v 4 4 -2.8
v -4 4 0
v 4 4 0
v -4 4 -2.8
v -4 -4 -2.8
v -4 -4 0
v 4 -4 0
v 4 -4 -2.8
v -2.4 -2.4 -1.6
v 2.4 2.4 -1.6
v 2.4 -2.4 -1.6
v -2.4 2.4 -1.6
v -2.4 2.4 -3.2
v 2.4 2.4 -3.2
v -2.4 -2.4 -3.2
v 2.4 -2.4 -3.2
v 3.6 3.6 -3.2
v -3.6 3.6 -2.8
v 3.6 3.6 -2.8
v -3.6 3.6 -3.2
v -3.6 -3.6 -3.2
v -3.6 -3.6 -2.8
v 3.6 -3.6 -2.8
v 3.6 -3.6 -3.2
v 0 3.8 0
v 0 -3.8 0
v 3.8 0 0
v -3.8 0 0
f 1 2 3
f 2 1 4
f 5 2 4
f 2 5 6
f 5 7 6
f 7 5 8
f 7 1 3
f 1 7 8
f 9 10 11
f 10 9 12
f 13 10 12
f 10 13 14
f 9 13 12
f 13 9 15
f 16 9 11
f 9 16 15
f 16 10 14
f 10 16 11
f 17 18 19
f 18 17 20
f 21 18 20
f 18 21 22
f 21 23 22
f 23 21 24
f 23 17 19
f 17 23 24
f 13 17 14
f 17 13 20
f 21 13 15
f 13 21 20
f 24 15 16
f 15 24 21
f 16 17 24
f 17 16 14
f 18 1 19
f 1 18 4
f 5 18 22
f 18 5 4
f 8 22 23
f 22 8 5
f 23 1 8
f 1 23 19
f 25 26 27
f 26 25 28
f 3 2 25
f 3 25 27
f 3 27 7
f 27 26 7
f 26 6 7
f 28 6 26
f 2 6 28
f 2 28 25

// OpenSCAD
// file: ../p/box5.scad
use <../lib.scad>
function ldraw_lib__box5() = [
// 0 Box with 5 Faces and All Edges
// 0 Name: box5.dat
// 0 Author: James Jessiman
// 0 !LDRAW_ORG Primitive UPDATE 2012-01
// 0 !LICENSE Licensed under CC BY 4.0 : see CAreadme.txt
// 
// 0 BFC CERTIFY CCW
  [0,"BFC","CERTIFY"],
  [0,"BFC","CCW"],
// 
// 0 !HISTORY 2002-04-03 [sbliss] Modified for BFC compliance
// 0 !HISTORY 2002-04-25 [PTadmin] Official Update 2002-02
// 0 !HISTORY 2007-06-24 [PTadmin] Header formatted for Contributor Agreement
// 0 !HISTORY 2008-07-01 [PTadmin] Official Update 2008-01
// 0 !HISTORY 2012-02-16 [Philo] Changed to CCW
// 0 !HISTORY 2012-03-30 [PTadmin] Official Update 2012-01
// 
// 
// 2 24 1 1 1 -1 1 1
  [2,24,1,1,1,-1,1,1],
// 2 24 -1 1 1 -1 1 -1
  [2,24,-1,1,1,-1,1,-1],
// 2 24 -1 1 -1 1 1 -1
  [2,24,-1,1,-1,1,1,-1],
// 2 24 1 1 -1 1 1 1
  [2,24,1,1,-1,1,1,1],
// 2 24 1 0 1 -1 0 1
  [2,24,1,0,1,-1,0,1],
// 2 24 -1 0 1 -1 0 -1
  [2,24,-1,0,1,-1,0,-1],
// 2 24 -1 0 -1 1 0 -1
  [2,24,-1,0,-1,1,0,-1],
// 2 24 1 0 -1 1 0 1
  [2,24,1,0,-1,1,0,1],
// 2 24 1 0 1 1 1 1
  [2,24,1,0,1,1,1,1],
// 2 24 -1 0 1 -1 1 1
  [2,24,-1,0,1,-1,1,1],
// 2 24 1 0 -1 1 1 -1
  [2,24,1,0,-1,1,1,-1],
// 2 24 -1 0 -1 -1 1 -1
  [2,24,-1,0,-1,-1,1,-1],
// 4 16 -1 1 1 1 1 1 1 1 -1 -1 1 -1
  [4,16,-1,1,1,1,1,1,1,1,-1,-1,1,-1],
// 4 16 -1 1 1 -1 0 1 1 0 1 1 1 1
  [4,16,-1,1,1,-1,0,1,1,0,1,1,1,1],
// 4 16 -1 1 -1 -1 0 -1 -1 0 1 -1 1 1
  [4,16,-1,1,-1,-1,0,-1,-1,0,1,-1,1,1],
// 4 16 1 1 -1 1 0 -1 -1 0 -1 -1 1 -1
  [4,16,1,1,-1,1,0,-1,-1,0,-1,-1,1,-1],
// 4 16 1 1 1 1 0 1 1 0 -1 1 1 -1
  [4,16,1,1,1,1,0,1,1,0,-1,1,1,-1],
];
module ldraw_lib__box5(step=0, col=false, unit=2/5, alt=false, line=0.2, solid=!$preview)
    makepoly(ldraw_lib__box5(), step=step, col=col, unit=unit, alt=alt, line=line, solid=solid);
ldraw_lib__box5(line=0.2);
// file: ../p/box4.scad
use <../lib.scad>
function ldraw_lib__box4() = [
// 0 Box with 4 Faces (2 Parallel Pairs) and All Edges
// 0 Name: box4.dat
// 0 Author: James Jessiman
// 0 !LDRAW_ORG Primitive UPDATE 2012-01
// 0 !LICENSE Licensed under CC BY 4.0 : see CAreadme.txt
// 
// 0 BFC CERTIFY CCW
  [0,"BFC","CERTIFY"],
  [0,"BFC","CCW"],
// 
// 0 !HISTORY 2002-04-03 [sbliss] Modified for BFC compliance
// 0 !HISTORY 2002-04-25 [PTadmin] Official Update 2002-02
// 0 !HISTORY 2007-06-24 [PTadmin] Header formatted for Contributor Agreement
// 0 !HISTORY 2008-07-01 [PTadmin] Official Update 2008-01
// 0 !HISTORY 2012-02-16 [Philo] Changed to CCW
// 0 !HISTORY 2012-03-30 [PTadmin] Official Update 2012-01
// 
// 
// 2 24 1 1 1 -1 1 1
  [2,24,1,1,1,-1,1,1],
// 2 24 -1 1 1 -1 1 -1
  [2,24,-1,1,1,-1,1,-1],
// 2 24 -1 1 -1 1 1 -1
  [2,24,-1,1,-1,1,1,-1],
// 2 24 1 1 -1 1 1 1
  [2,24,1,1,-1,1,1,1],
// 2 24 1 0 1 -1 0 1
  [2,24,1,0,1,-1,0,1],
// 2 24 -1 0 1 -1 0 -1
  [2,24,-1,0,1,-1,0,-1],
// 2 24 -1 0 -1 1 0 -1
  [2,24,-1,0,-1,1,0,-1],
// 2 24 1 0 -1 1 0 1
  [2,24,1,0,-1,1,0,1],
// 2 24 1 0 1 1 1 1
  [2,24,1,0,1,1,1,1],
// 2 24 -1 0 1 -1 1 1
  [2,24,-1,0,1,-1,1,1],
// 2 24 1 0 -1 1 1 -1
  [2,24,1,0,-1,1,1,-1],
// 2 24 -1 0 -1 -1 1 -1
  [2,24,-1,0,-1,-1,1,-1],
// 4 16 -1 1 1 -1 0 1 1 0 1 1 1 1
  [4,16,-1,1,1,-1,0,1,1,0,1,1,1,1],
// 4 16 -1 1 -1 -1 0 -1 -1 0 1 -1 1 1
  [4,16,-1,1,-1,-1,0,-1,-1,0,1,-1,1,1],
// 4 16 1 1 -1 1 0 -1 -1 0 -1 -1 1 -1
  [4,16,1,1,-1,1,0,-1,-1,0,-1,-1,1,-1],
// 4 16 1 1 1 1 0 1 1 0 -1 1 1 -1
  [4,16,1,1,1,1,0,1,1,0,-1,1,1,-1],
];
module ldraw_lib__box4(step=0, col=false, unit=2/5, alt=false, line=0.2, solid=!$preview)
    makepoly(ldraw_lib__box4(), step=step, col=col, unit=unit, alt=alt, line=line, solid=solid);
ldraw_lib__box4(line=0.2);
// file: s/3070bs01.scad
use <../../lib.scad>
use <../../p/box4.scad>
use <../../p/box5.scad>
function ldraw_lib__s__3070bs01() = [
// 0 ~Tile  1 x  1 with Groove without Top Face
// 0 Name: s\3070bs01.dat
// 0 Author: Chris Dee [cwdee]
// 0 !LDRAW_ORG Subpart UPDATE 2009-02
// 0 !LICENSE Licensed under CC BY 4.0 : see CAreadme.txt
// 
// 0 BFC CERTIFY CCW
  [0,"BFC","CERTIFY"],
  [0,"BFC","CCW"],
// 
// 0 !HISTORY 2009-09-03 [PTadmin] Official Update 2009-02
// 
// 
// 1 16 0 0 0 10 0 0 0 7 0 0 0 10 box4.dat
  [1,16,0,0,0,10,0,0,0,7,0,0,0,10, ldraw_lib__box4()],
// 0 BFC INVERTNEXT
  [0,"BFC","INVERTNEXT"],
// 1 16 0 8 0 6 0 0 0 -4 0 0 0 6 box5.dat
  [1,16,0,8,0,6,0,0,0,-4,0,0,0,6, ldraw_lib__box5()],
// 1 16 0 7 0 9 0 0 0 1 0 0 0 9 box4.dat
  [1,16,0,7,0,9,0,0,0,1,0,0,0,9, ldraw_lib__box4()],
// 
// 4 16 9 8 9 6 8 6 -6 8 6 -9 8 9
  [4,16,9,8,9,6,8,6,-6,8,6,-9,8,9],
// 4 16 -9 8 9 -6 8 6 -6 8 -6 -9 8 -9
  [4,16,-9,8,9,-6,8,6,-6,8,-6,-9,8,-9],
// 4 16 -9 8 -9 -6 8 -6 6 8 -6 9 8 -9
  [4,16,-9,8,-9,-6,8,-6,6,8,-6,9,8,-9],
// 4 16 9 8 -9 6 8 -6 6 8 6 9 8 9
  [4,16,9,8,-9,6,8,-6,6,8,6,9,8,9],
// 
// 4 16 10 7 10 9 7 9 -9 7 9 -10 7 10
  [4,16,10,7,10,9,7,9,-9,7,9,-10,7,10],
// 4 16 -10 7 10 -9 7 9 -9 7 -9 -10 7 -10
  [4,16,-10,7,10,-9,7,9,-9,7,-9,-10,7,-10],
// 4 16 -10 7 -10 -9 7 -9 9 7 -9 10 7 -10
  [4,16,-10,7,-10,-9,7,-9,9,7,-9,10,7,-10],
// 4 16 10 7 -10 9 7 -9 9 7 9 10 7 10
  [4,16,10,7,-10,9,7,-9,9,7,9,10,7,10],
// 0
];
module ldraw_lib__s__3070bs01(step=0, col=false, unit=2/5, alt=false, line=0.2, solid=!$preview)
    makepoly(ldraw_lib__s__3070bs01(), step=step, col=col, unit=unit, alt=alt, line=line, solid=solid);
ldraw_lib__s__3070bs01(line=0.2);
// main file
use <../lib.scad>
use <s/3070bs01.scad>
function ldraw_lib__3070bp1q() = [
// 0 Tile  1 x  1 with Dark Bluish Grey Diamond Pattern
// 0 Name: 3070bp1q.dat
// 0 Author: Florent Faramond [Makou]
// 0 !LDRAW_ORG Part UPDATE 2024-08
// 0 !LICENSE Licensed under CC BY 4.0 : see CAreadme.txt
// 
// 0 BFC CERTIFY CCW
  [0,"BFC","CERTIFY"],
  [0,"BFC","CCW"],
// 
// 0 !KEYWORDS Bricklink 3070pb226, Rebrickable 3070bpr0262, Set 71395
// 
// 0 !HISTORY 2024-09-30 [OrionP] Official Update 2024-08
// 
// 1 16 0 0 0 1 0 0 0 1 0 0 0 1 s\3070bs01.dat
  [1,16,0,0,0,1,0,0,0,1,0,0,0,1, ldraw_lib__s__3070bs01()],
// 
// 4 72 0 0 -9.5 9.5 0 0 0 0 9.5 -9.5 0 0
  [4,72,0,0,-9.5,9.5,0,0,0,0,9.5,-9.5,0,0],
// 3 16 10 0 10 -10 0 10 0 0 9.5
  [3,16,10,0,10,-10,0,10,0,0,9.5],
// 3 16 10 0 10 0 0 9.5 9.5 0 0
  [3,16,10,0,10,0,0,9.5,9.5,0,0],
// 3 16 10 0 10 9.5 0 0 10 0 -10
  [3,16,10,0,10,9.5,0,0,10,0,-10],
// 3 16 9.5 0 0 0 0 -9.5 10 0 -10
  [3,16,9.5,0,0,0,0,-9.5,10,0,-10],
// 3 16 0 0 -9.5 -10 0 -10 10 0 -10
  [3,16,0,0,-9.5,-10,0,-10,10,0,-10],
// 3 16 -9.5 0 0 -10 0 -10 0 0 -9.5
  [3,16,-9.5,0,0,-10,0,-10,0,0,-9.5],
// 3 16 -10 0 10 -10 0 -10 -9.5 0 0
  [3,16,-10,0,10,-10,0,-10,-9.5,0,0],
// 3 16 -10 0 10 -9.5 0 0 0 0 9.5
  [3,16,-10,0,10,-9.5,0,0,0,0,9.5],
];
module ldraw_lib__3070bp1q(step=0, col=false, unit=2/5, alt=false, line=0.2, solid=!$preview)
    makepoly(ldraw_lib__3070bp1q(), step=step, col=col, unit=unit, alt=alt, line=line, solid=solid);
ldraw_lib__3070bp1q(line=0.2);
